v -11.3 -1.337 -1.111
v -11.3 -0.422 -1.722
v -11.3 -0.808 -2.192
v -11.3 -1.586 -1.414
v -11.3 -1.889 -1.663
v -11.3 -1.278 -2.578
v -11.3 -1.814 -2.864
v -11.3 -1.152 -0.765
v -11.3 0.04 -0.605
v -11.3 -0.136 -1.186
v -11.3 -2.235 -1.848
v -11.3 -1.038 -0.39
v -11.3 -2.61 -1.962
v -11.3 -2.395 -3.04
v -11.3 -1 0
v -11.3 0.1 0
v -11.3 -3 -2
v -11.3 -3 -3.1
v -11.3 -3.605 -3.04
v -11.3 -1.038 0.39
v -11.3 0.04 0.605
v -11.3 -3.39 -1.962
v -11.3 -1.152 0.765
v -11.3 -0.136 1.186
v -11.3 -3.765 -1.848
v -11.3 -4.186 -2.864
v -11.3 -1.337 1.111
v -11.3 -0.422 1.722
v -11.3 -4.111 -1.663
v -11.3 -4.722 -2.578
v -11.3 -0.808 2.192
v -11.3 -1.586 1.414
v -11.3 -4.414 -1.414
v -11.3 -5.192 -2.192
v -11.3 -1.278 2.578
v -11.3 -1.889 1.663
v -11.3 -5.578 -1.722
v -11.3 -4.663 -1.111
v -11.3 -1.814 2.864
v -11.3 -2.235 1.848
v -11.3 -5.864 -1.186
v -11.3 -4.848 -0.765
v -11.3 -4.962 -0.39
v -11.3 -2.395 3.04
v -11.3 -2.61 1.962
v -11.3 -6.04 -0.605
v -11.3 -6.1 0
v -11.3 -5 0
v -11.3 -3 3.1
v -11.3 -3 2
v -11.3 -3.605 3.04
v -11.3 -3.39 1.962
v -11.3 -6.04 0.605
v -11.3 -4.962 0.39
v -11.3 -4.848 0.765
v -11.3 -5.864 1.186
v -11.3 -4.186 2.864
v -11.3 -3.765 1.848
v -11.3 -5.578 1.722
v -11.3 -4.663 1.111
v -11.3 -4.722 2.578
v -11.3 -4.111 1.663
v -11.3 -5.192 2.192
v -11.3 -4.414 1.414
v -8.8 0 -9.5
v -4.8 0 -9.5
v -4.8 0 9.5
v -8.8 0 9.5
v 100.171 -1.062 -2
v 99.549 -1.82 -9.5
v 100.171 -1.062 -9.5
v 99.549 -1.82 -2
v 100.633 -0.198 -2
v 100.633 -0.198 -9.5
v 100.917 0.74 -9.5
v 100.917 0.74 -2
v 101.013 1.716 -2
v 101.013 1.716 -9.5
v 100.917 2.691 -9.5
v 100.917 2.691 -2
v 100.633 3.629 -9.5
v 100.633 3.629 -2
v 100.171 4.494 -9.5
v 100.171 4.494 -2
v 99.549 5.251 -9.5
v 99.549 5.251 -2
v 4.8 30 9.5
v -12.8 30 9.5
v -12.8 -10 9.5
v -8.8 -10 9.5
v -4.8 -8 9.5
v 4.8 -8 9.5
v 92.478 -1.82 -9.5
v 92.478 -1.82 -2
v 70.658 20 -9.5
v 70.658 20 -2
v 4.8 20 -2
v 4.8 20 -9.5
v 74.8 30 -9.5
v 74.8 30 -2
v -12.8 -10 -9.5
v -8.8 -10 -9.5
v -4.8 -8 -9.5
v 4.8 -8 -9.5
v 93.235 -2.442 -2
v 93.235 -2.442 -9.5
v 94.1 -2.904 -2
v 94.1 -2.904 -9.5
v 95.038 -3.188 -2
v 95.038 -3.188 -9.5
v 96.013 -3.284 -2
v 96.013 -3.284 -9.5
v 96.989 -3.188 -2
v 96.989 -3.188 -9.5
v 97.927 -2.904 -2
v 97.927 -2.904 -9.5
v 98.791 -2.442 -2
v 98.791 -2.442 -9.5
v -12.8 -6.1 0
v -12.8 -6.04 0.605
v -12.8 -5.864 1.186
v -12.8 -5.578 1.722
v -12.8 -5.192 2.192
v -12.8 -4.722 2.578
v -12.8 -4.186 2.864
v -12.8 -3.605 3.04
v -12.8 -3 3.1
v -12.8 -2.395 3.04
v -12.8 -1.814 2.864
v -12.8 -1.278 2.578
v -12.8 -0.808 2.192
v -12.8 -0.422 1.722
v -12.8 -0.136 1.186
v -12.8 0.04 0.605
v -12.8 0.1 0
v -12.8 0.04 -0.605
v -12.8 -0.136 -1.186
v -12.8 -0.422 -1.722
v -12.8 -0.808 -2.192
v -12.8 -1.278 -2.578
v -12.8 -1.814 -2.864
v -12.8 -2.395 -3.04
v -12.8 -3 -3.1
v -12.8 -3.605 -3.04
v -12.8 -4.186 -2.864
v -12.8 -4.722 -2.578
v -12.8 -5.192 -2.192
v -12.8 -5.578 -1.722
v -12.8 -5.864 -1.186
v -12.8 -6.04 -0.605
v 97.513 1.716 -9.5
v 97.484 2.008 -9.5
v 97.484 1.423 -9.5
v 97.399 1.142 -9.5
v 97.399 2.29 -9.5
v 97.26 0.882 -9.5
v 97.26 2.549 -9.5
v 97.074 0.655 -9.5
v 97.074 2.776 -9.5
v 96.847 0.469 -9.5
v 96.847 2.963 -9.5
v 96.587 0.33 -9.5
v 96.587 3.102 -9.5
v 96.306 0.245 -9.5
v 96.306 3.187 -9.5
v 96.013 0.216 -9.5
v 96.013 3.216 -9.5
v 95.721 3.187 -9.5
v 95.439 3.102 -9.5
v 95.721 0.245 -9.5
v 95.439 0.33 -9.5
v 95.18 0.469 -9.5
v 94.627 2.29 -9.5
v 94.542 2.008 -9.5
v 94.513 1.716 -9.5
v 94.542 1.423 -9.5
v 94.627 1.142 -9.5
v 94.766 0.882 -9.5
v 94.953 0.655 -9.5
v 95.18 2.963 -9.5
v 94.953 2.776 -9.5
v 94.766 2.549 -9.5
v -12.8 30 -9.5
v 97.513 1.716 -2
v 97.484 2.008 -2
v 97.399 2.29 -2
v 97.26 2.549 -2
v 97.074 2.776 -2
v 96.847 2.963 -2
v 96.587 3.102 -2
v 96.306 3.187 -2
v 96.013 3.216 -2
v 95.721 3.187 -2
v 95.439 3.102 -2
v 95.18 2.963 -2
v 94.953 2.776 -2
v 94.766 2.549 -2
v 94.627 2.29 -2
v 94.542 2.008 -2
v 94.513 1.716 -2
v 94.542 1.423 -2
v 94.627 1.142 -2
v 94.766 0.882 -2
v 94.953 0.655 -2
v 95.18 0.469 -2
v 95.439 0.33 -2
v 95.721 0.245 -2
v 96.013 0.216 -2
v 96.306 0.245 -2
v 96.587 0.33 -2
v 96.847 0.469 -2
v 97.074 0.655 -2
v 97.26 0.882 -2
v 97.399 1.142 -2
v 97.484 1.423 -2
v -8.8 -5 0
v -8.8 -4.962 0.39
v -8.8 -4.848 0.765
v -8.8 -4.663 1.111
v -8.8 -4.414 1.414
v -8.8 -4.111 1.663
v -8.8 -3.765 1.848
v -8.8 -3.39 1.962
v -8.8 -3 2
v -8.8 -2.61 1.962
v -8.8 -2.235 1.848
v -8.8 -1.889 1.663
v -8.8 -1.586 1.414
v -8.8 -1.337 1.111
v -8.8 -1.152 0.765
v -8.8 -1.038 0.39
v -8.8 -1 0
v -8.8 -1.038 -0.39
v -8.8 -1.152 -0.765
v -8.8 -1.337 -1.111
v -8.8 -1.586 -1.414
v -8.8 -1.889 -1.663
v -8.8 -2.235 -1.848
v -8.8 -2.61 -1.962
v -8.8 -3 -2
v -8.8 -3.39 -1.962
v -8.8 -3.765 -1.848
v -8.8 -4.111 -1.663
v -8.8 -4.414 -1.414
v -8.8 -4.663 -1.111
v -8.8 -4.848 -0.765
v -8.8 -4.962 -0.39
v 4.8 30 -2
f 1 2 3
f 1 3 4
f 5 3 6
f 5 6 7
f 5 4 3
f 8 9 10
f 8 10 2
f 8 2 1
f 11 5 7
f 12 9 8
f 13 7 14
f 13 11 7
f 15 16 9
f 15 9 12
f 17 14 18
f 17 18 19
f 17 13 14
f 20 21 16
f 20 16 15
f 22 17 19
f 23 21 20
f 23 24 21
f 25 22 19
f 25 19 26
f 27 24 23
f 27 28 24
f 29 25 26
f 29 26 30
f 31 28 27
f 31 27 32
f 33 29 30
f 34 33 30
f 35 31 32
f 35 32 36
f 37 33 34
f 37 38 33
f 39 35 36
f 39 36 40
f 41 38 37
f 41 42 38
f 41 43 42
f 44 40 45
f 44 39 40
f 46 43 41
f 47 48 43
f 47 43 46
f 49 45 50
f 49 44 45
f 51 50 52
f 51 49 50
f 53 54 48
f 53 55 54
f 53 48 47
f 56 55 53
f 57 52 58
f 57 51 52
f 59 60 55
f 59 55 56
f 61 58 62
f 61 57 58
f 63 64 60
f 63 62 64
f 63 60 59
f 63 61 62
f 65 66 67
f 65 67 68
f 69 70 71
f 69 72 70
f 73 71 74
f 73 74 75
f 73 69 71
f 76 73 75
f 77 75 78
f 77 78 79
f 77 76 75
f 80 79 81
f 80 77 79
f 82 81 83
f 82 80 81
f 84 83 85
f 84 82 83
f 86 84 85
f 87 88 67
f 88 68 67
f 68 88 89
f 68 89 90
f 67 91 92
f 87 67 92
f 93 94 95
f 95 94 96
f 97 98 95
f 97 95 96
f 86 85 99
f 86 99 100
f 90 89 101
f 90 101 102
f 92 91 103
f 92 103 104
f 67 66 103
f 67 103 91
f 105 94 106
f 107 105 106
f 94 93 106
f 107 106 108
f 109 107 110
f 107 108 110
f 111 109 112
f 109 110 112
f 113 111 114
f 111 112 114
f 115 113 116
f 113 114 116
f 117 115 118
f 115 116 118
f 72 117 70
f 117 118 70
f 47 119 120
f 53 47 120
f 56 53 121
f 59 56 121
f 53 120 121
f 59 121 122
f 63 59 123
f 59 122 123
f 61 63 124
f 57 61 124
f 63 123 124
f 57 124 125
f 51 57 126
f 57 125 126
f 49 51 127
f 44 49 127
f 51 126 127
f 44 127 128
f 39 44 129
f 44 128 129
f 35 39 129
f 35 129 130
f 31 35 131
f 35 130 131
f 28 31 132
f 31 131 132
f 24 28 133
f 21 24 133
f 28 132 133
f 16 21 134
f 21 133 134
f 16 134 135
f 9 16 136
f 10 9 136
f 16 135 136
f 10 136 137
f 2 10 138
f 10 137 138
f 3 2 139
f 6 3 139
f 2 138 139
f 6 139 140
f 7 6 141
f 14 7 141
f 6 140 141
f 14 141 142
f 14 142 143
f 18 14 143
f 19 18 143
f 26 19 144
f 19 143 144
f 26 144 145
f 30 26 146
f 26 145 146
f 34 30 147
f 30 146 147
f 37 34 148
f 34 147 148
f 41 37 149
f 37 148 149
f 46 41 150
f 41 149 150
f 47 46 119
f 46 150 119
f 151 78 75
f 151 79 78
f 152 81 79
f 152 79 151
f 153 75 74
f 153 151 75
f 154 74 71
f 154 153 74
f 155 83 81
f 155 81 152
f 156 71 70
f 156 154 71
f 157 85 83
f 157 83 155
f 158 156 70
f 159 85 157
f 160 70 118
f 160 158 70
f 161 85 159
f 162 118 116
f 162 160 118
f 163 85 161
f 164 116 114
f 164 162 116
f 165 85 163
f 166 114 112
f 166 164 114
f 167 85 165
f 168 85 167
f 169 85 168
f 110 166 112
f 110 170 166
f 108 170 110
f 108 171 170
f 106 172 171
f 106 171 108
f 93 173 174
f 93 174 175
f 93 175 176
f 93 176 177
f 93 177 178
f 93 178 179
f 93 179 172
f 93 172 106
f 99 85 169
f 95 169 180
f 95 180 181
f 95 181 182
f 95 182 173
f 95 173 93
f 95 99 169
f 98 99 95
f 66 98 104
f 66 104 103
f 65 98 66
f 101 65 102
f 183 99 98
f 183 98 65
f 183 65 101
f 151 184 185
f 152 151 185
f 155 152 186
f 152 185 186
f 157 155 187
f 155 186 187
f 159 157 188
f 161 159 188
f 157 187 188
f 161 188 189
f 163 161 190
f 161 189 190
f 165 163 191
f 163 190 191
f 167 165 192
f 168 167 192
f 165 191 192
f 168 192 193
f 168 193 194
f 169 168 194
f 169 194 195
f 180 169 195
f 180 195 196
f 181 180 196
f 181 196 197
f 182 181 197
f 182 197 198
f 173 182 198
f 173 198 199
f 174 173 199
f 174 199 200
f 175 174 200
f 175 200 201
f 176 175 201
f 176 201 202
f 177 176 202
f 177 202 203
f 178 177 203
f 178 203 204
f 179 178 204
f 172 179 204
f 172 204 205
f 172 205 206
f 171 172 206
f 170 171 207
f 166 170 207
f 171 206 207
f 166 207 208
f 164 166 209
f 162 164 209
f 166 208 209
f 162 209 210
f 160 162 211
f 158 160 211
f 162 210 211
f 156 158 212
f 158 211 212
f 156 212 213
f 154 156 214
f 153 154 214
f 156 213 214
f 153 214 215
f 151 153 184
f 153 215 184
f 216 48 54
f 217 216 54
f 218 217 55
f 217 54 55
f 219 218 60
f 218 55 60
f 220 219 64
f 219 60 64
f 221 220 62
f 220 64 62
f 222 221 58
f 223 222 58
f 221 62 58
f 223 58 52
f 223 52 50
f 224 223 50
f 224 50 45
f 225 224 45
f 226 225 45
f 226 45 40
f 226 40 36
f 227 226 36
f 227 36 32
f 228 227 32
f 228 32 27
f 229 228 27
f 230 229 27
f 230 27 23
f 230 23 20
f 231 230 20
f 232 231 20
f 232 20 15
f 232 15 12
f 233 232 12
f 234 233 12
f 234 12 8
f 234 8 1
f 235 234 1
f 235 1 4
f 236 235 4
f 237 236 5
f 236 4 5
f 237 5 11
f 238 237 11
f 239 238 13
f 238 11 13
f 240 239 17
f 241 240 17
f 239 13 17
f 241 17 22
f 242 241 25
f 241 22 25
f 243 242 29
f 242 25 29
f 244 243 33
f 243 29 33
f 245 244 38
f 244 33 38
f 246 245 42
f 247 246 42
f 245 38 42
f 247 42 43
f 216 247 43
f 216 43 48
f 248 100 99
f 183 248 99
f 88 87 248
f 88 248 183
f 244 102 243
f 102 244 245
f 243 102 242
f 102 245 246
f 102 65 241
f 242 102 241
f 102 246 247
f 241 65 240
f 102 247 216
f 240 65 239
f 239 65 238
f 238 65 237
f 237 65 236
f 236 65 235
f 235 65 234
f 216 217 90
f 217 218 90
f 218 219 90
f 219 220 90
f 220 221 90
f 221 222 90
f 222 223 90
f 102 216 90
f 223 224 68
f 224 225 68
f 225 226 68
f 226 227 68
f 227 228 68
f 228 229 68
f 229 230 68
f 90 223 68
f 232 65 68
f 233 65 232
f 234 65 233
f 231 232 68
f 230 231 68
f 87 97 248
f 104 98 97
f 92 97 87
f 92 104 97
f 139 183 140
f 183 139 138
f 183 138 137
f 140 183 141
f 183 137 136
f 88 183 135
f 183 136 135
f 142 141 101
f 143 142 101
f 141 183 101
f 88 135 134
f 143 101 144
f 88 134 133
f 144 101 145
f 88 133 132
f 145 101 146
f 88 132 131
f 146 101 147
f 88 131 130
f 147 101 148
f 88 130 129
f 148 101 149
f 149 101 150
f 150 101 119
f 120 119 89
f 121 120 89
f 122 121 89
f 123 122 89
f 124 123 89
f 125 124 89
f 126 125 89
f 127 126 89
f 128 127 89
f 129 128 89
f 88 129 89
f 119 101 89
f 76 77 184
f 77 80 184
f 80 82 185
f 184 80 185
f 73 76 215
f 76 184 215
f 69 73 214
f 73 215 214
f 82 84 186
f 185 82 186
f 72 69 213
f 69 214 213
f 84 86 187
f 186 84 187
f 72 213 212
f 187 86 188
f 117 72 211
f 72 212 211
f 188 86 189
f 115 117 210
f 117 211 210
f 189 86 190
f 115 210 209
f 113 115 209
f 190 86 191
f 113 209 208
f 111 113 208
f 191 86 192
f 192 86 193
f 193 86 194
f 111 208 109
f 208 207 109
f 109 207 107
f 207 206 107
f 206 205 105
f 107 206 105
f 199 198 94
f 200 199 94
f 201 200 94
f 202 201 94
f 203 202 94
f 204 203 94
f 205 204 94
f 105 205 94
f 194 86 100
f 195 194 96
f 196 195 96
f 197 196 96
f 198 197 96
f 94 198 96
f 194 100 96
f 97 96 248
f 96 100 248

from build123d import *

# Parameters (mm, degrees)
F0_W      = 9.6
F0_H      = 19
F1_DEPTH  = 8
F2_W      = 4
F2_H      = 19
F2_W_2    = 9.6
F3_DEPTH  = 5
F4_W      = 4
F4_H      = 19
F5_DEPTH  = 10
F6_R      = 2
F7_DEPTH  = 4
F6_R_2    = 3.1
F8_DEPTH  = 1.5
F9_W      = 17.6
F9_H      = 7.5
F10_DEPTH = 25
F11_W     = 10
F11_H     = 7.5
F12_DEPTH = 70
F14_DEPTH = 25
F15_DEPTH = 40
F16_R     = 1.5
F17_DEPTH = 25
F18_DEPTH = 25
F20_DEPTH = 25
F21_R     = 4.99999


# Not quite as in the source:
# - a fillet or chamfer is up to 0.001 mm smaller than in the source, because OpenCascade refuses the exact size


with BuildPart() as f1:
    # F0 (on Front) → F1 (new body)
    with BuildSketch(Plane.XZ):
        Rectangle(F0_W, F0_H)
    extrude(amount=F1_DEPTH)

    # F2 (on face) → F3 (join)
    with BuildSketch(Plane(origin=(0, 0, 0), x_dir=(-1, 0, 0), z_dir=(0, 1, 0))):
        with Locations((6.8, 0)):
            Rectangle(F2_W, F2_H)
        Rectangle(F2_W_2, F2_H)
        with Locations((10.8, 0)):
            Rectangle(F2_W, F2_H)
    extrude(amount=F3_DEPTH)

    # F4 (on face) → F5 (join)
    with BuildSketch(Plane.XZ):
        with Locations((-10.8, 0)):
            Rectangle(F4_W, F4_H)
    extrude(amount=F5_DEPTH)

    # F6 (on face) → F7 (cut, through all)
    with BuildSketch(Plane(origin=(-12.8, 0, 0), x_dir=(0, -1, 0), z_dir=(-1, 0, 0))):
        with Locations((3, 0)):
            Circle(F6_R)
    extrude(amount=-F7_DEPTH, mode=Mode.SUBTRACT)

    # F6 (on face) → F8 (cut)
    with BuildSketch(Plane(origin=(-12.8, 0, 0), x_dir=(0, -1, 0), z_dir=(-1, 0, 0))):
        with Locations((3, 0)):
            Circle(F6_R_2)
        with Locations((3, 0)):
            Circle(F6_R, mode=Mode.SUBTRACT)
    extrude(amount=-F8_DEPTH, mode=Mode.SUBTRACT)

    # F9 (on face) → F10 (join)
    with BuildSketch(Plane(origin=(0, 5, 0), x_dir=(-1, 0, 0), z_dir=(0, 1, 0))):
        with Locations((4, -5.75)):
            Rectangle(F9_W, F9_H)
    extrude(amount=F10_DEPTH)

    # F11 (on face) → F12 (join)
    with BuildSketch(Plane.YZ.offset(4.8)):
        with Locations((25, -5.75)):
            Rectangle(F11_W, F11_H)
    extrude(amount=F12_DEPTH)

    # F13 (on face) → F14 (cut)
    with BuildSketch(Plane.XY.offset(-2)):
        Polygon((74.8, 30), (64.8, 20), (74.8, 20), align=None)
    extrude(amount=-F14_DEPTH, mode=Mode.SUBTRACT)

    # F15 (add): a face of the model
    f15_faces = [f1.faces().sort_by_distance(p)[0] for p in [
        (69.8, 25, -5.75),
    ]]
    extrude(f15_faces, amount=F15_DEPTH)

    # F16 (on face) → F17 (cut)
    with BuildSketch(Plane.XY.offset(-2)):
        with Locations((96.0132034356, 1.7157287525)):
            Circle(F16_R)
    extrude(amount=-F17_DEPTH, mode=Mode.SUBTRACT)

    # F18 (add): a face of the model
    f18_faces = [f1.faces().sort_by_distance(p)[0] for p in [
        (-4, 5, 3.75),
    ]]
    extrude(f18_faces, amount=F18_DEPTH)

    # F19 (on face) → F20 (cut)
    with BuildSketch(Plane.XY.offset(-2)):
        Polygon((93.0842712475, -8.2842712475), (96.0132034356, -5.3553390593), (70.6578643763, 20), (64.8, 20), align=None)
    extrude(amount=-F20_DEPTH, mode=Mode.SUBTRACT)

    # F21 (radius 5 in the source; OpenCascade refuses exactly that, so slightly less here)
    f21_edges = [f1.edges().sort_by_distance(p)[0] for p in [
        (96.013203, -5.355339, -5.75),
        (103.084271, 1.715729, -5.75),
    ]]
    fillet(f21_edges, radius=F21_R)


solid = f1.part
